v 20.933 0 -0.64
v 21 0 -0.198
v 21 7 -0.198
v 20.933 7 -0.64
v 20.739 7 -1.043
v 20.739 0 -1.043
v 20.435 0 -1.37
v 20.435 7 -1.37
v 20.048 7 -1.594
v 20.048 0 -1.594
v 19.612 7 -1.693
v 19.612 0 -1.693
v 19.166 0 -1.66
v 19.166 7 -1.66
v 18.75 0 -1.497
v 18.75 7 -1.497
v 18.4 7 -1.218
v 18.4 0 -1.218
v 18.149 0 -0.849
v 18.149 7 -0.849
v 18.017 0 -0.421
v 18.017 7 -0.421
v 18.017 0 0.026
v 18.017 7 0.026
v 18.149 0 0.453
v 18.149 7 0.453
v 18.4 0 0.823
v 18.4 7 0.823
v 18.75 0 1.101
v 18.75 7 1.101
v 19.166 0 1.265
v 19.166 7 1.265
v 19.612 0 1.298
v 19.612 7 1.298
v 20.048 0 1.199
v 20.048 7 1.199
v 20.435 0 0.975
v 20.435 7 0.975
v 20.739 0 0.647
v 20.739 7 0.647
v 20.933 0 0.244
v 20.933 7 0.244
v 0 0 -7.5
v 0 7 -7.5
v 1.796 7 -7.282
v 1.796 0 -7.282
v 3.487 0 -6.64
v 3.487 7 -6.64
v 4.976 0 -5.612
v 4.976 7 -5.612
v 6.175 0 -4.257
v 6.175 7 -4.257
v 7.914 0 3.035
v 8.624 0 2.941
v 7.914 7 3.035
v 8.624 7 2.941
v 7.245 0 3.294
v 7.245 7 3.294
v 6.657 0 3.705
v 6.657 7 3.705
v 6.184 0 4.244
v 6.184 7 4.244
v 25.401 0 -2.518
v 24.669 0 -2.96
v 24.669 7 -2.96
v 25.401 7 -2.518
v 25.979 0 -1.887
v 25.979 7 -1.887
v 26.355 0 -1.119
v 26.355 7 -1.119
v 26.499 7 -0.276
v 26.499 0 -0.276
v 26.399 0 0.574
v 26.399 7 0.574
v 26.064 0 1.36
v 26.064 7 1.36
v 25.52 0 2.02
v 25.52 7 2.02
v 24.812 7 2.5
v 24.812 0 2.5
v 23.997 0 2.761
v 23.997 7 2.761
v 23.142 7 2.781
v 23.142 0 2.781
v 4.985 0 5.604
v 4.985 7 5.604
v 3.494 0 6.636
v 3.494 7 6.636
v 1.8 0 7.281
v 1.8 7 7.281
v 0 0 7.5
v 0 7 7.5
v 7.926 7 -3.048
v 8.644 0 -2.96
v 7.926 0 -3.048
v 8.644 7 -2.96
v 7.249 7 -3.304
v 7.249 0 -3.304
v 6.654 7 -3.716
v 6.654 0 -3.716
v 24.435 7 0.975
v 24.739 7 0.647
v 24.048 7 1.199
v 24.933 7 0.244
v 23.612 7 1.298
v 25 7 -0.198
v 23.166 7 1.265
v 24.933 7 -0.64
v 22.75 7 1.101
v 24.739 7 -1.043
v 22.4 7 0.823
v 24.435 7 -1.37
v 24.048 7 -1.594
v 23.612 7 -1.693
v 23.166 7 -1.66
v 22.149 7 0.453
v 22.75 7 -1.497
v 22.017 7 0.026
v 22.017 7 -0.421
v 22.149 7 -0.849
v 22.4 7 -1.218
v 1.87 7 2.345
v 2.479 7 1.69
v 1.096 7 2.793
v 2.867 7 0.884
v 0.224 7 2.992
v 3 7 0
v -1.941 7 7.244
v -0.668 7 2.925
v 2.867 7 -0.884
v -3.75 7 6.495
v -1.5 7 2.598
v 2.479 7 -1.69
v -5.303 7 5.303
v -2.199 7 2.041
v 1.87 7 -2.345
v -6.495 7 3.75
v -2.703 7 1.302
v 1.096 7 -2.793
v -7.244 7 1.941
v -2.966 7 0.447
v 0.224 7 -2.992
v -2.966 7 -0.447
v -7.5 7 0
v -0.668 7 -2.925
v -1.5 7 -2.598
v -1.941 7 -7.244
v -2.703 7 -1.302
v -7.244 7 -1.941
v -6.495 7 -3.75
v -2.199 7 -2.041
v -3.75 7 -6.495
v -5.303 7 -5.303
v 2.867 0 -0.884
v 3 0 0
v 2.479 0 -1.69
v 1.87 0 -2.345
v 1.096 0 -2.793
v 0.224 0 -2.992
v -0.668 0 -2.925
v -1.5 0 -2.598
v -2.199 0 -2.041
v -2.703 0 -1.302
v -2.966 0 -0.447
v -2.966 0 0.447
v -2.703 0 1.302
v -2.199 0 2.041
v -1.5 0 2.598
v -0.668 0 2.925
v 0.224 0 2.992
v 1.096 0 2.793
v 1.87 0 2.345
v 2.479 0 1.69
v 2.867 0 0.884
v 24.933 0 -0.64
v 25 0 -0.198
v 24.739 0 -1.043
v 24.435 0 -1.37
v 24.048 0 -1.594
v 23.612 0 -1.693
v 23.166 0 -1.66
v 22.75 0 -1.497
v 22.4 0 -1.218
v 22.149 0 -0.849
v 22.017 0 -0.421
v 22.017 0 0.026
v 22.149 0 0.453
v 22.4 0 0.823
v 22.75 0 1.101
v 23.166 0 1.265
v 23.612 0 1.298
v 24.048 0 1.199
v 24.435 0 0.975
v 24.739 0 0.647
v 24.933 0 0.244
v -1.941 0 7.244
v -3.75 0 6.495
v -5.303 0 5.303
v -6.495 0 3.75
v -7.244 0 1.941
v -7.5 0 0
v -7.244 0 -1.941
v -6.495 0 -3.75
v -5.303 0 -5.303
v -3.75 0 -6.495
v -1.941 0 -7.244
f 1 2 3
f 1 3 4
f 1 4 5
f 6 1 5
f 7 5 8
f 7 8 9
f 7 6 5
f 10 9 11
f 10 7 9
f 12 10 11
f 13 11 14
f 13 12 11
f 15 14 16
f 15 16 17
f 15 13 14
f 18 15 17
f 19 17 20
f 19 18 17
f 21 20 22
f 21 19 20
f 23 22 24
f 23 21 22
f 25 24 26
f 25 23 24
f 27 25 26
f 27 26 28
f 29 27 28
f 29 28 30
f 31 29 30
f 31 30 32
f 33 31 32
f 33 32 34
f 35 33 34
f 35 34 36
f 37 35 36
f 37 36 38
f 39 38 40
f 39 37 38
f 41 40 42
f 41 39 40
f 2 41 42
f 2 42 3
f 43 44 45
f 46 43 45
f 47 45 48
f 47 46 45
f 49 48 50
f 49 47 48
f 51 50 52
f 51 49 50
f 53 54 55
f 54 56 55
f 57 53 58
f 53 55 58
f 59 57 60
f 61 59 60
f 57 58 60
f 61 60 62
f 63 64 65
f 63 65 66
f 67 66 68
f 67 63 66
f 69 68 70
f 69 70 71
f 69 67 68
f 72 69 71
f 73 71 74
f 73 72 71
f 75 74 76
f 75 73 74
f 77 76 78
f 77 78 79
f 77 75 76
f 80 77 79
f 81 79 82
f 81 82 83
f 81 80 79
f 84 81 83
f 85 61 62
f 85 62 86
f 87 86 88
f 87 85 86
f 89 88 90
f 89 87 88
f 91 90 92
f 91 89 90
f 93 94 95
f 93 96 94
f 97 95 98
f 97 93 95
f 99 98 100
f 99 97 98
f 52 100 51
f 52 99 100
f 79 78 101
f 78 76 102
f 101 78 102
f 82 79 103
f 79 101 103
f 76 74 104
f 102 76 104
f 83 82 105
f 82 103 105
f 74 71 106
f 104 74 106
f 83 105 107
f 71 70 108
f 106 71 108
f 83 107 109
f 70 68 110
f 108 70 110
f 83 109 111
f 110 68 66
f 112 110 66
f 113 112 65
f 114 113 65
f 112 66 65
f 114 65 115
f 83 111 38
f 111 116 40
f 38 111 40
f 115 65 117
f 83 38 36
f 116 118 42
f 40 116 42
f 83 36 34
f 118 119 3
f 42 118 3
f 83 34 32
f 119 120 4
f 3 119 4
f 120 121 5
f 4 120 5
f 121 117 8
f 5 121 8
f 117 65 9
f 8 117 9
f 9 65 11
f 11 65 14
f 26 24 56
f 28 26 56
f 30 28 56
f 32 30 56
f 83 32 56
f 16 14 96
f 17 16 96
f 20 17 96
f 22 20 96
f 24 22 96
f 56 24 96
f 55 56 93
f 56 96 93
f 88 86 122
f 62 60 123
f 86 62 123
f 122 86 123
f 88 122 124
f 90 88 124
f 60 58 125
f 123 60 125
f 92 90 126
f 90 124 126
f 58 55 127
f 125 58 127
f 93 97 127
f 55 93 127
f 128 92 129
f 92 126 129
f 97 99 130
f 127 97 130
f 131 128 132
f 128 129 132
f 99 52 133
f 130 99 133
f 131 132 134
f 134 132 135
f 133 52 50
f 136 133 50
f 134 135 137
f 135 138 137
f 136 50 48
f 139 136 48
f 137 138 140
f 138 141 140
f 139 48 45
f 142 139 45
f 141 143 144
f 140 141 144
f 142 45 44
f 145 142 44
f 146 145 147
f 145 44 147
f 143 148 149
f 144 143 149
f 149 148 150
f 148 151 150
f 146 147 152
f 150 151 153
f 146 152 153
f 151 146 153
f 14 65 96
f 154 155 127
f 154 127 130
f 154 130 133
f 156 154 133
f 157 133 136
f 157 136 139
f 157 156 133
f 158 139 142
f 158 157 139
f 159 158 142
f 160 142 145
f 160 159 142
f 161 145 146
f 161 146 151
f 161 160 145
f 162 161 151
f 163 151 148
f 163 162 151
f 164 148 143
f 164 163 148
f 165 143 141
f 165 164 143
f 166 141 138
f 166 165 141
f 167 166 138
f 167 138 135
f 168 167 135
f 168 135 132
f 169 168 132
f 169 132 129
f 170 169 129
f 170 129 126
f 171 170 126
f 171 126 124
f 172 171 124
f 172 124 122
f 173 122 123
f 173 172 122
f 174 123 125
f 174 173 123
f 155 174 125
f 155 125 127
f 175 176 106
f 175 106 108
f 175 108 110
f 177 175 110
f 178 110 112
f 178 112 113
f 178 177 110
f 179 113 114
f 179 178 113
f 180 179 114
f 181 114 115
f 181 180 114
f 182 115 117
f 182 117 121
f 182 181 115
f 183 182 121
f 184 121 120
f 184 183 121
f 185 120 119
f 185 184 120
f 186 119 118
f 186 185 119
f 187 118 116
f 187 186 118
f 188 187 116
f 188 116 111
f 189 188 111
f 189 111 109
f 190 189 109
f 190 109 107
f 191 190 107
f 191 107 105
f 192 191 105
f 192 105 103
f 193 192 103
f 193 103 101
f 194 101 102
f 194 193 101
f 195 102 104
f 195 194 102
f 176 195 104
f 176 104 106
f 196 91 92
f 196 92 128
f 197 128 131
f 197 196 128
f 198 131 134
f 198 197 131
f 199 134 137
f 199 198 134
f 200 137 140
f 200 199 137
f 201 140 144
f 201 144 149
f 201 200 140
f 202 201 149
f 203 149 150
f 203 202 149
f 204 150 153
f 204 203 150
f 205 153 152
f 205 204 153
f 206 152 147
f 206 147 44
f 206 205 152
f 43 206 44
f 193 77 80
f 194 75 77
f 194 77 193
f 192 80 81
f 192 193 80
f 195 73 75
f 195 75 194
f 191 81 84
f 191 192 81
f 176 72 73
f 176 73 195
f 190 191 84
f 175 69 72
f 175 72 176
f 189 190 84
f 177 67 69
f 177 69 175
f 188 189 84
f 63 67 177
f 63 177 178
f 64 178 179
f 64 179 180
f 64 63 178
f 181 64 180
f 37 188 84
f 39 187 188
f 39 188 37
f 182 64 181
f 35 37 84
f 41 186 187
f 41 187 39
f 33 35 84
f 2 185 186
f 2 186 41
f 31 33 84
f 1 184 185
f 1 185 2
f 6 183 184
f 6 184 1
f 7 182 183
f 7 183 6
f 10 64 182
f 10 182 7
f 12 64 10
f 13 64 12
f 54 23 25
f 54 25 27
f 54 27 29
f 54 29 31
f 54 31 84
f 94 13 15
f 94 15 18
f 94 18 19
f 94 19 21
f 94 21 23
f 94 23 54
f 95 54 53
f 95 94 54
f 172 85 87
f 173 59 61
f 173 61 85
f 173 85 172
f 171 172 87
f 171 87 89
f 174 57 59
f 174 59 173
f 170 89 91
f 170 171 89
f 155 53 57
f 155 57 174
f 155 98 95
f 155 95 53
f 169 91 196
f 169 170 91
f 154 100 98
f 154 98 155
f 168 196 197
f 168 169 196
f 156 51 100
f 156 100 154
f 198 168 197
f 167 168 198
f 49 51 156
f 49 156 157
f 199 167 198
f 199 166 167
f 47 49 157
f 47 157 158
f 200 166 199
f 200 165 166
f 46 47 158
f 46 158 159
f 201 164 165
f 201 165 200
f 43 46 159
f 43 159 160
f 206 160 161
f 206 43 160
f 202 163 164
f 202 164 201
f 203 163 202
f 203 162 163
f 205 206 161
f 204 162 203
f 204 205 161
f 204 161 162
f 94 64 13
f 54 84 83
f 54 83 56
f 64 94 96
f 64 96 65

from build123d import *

# Parameters (mm, degrees)
SKETCH4_R           = 1.5
SKETCH4_R_2         = 3
BOSS_EXTRUDE1_DEPTH = 7
FILLET1_R           = 3


with BuildPart() as part:
    # Sketch4 → Boss-Extrude1 (new body)
    with BuildSketch(Plane(origin=(0, 0, 0), x_dir=(1, 0, 0), z_dir=(0, 1, 0))):
        with BuildLine():
            Line((6.89102232, 2.960373522), (24.66941446, 2.960373522))
            ThreePointArc((24.66941446, 2.960373522), (26.39916632, -0.573574214), (23.142085355, -2.780891971))
            Line((23.142085355, -2.780891971), (6.89102232, -2.960373522))
            ThreePointArc((6.89102232, -2.960373522), (4.125966468, -6.263098331), (0, -7.5))
            ThreePointArc((0, -7.5), (-7.5, 0), (0, 7.5))
            ThreePointArc((0, 7.5), (4.125966468, 6.263098331), (6.89102232, 2.960373522))
        make_face()
        with Locations((23.5, 0.197681027)):
            Circle(SKETCH4_R, mode=Mode.SUBTRACT)
        with Locations((19.5, 0.197681027)):
            Circle(SKETCH4_R, mode=Mode.SUBTRACT)
        Circle(SKETCH4_R_2, mode=Mode.SUBTRACT)
    extrude(amount=BOSS_EXTRUDE1_DEPTH)

    # Fillet1
    fillet1_edges = [part.edges().sort_by_distance(p)[0] for p in [
        (6.89102232, 3.5, -2.960373522),
        (6.89102232, 3.5, 2.960373522),
    ]]
    fillet(fillet1_edges, radius=FILLET1_R)


solid = part.part
